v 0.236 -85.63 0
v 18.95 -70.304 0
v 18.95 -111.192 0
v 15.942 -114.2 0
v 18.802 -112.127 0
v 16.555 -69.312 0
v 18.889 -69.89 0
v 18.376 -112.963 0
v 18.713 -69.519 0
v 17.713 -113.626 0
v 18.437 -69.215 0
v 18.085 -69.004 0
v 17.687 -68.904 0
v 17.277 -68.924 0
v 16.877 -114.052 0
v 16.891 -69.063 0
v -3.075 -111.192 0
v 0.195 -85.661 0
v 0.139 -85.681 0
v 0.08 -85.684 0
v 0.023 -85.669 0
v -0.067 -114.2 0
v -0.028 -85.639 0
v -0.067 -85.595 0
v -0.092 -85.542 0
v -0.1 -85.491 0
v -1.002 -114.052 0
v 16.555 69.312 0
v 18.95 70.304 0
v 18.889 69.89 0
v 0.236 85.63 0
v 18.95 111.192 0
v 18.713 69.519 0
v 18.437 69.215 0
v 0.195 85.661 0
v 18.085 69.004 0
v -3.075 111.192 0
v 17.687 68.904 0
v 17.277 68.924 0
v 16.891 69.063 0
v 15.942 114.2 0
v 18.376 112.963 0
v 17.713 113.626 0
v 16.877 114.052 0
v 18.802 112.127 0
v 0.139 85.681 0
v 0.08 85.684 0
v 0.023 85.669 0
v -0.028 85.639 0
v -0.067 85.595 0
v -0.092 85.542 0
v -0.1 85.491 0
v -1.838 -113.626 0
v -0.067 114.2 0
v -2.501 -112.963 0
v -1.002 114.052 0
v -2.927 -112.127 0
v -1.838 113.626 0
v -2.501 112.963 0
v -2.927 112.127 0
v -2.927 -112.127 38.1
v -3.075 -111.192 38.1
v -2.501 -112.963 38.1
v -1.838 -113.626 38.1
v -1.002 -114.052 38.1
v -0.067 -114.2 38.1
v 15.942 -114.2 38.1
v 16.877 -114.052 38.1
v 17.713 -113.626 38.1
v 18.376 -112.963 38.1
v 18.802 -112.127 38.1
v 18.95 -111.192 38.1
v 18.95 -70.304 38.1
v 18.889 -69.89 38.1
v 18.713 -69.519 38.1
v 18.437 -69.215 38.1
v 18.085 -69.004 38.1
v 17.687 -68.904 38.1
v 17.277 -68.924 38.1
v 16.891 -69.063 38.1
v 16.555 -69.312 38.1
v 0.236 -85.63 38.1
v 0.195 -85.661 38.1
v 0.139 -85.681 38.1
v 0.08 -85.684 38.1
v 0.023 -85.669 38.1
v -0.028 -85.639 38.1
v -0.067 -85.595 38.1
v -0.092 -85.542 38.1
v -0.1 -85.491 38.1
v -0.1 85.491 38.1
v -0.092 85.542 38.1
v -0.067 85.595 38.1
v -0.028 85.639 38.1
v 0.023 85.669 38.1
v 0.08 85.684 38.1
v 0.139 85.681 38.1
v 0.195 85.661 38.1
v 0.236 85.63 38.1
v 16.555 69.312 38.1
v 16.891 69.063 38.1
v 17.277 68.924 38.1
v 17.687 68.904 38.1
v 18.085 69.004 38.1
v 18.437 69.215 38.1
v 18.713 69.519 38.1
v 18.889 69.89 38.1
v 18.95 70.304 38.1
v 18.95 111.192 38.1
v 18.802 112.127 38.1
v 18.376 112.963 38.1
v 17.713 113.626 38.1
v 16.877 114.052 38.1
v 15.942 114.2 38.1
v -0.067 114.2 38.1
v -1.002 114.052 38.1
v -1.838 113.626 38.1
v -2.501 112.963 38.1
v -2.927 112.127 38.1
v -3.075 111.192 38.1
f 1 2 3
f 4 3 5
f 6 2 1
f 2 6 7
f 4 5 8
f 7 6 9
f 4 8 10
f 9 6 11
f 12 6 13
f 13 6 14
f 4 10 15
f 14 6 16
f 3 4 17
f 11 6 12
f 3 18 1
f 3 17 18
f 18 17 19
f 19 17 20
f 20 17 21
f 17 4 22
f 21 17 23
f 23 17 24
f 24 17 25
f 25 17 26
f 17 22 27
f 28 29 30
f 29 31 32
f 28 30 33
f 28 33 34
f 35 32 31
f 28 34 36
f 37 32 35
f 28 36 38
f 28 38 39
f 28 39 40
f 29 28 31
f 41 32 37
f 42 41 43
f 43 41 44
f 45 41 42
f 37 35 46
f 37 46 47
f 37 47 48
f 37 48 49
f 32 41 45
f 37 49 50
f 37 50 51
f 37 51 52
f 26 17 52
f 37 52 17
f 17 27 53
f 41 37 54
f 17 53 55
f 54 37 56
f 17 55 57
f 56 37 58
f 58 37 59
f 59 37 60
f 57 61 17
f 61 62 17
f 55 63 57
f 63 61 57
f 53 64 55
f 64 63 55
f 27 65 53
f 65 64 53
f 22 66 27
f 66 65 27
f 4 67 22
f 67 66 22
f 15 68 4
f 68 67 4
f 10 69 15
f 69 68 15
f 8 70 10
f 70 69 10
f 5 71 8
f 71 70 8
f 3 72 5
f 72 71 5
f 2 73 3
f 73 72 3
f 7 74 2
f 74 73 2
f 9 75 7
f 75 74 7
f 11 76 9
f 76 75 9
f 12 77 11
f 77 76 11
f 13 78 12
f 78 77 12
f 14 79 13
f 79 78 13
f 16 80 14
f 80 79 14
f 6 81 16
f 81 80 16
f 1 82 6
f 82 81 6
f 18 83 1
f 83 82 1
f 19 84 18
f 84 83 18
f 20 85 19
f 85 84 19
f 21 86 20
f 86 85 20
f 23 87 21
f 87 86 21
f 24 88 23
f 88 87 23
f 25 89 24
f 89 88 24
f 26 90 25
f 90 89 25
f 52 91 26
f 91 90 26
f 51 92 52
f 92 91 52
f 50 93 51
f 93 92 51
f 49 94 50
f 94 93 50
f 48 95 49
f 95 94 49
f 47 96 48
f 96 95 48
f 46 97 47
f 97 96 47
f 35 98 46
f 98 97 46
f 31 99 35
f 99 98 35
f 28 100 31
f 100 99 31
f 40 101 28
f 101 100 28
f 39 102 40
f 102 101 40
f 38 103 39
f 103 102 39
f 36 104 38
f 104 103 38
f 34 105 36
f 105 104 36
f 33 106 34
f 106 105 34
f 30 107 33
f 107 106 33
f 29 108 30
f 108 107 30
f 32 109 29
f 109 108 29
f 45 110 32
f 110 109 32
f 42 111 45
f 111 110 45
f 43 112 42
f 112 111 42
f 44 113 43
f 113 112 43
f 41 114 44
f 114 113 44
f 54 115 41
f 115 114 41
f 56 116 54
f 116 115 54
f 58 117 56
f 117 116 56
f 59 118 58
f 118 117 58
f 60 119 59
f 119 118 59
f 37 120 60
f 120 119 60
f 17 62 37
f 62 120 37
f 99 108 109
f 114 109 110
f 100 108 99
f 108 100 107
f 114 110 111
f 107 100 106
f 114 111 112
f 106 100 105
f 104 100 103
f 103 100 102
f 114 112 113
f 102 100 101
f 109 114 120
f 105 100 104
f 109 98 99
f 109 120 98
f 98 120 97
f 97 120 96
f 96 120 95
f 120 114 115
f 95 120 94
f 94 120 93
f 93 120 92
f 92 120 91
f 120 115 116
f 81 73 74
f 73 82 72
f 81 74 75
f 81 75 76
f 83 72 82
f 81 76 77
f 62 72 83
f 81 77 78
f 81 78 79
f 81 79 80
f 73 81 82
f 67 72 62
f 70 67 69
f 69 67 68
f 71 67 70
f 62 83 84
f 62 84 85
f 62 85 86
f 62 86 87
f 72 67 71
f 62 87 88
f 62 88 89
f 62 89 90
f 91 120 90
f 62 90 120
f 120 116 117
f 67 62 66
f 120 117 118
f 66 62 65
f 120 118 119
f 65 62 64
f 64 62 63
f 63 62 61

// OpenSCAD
// FCUnipanel0.1
// 
// French cleat + panel as a single part,
// because messing with screws can be annoying.

height = "6chunk";
width = "1chunk";
panel_thickness = "1/8inch";
fc_height = "1+1/2inch";
fc_thickness = "3/4inch";

$tgx11_offset = -0.1;
$fn = 24;

module fcunipanel0__end_params() { }

use <../lib/TOGPolyhedronLib1.scad>
use <../lib/TOGMod1.scad>
use <../lib/TOGPath1.scad>
use <../lib/TOGUnits1.scad>
use <../lib/TOGVecLib0.scad>

panel_thickness_mm = togunits1_to_mm(panel_thickness);
fc_thickness_mm = togunits1_to_mm(fc_thickness);
fc_height_mm = togunits1_to_mm(fc_height);
height_mm = togunits1_to_mm(height);
width_mm = togunits1_to_mm(width);

togmod1_domodule(tphl1_make_polyhedron_from_layer_function([
	[0       , 0],
	[width_mm, 0],
],
let( x0 = -panel_thickness_mm )
let( x1 = 0 )
let( x2 = fc_thickness_mm )
let( fcyd0 = 0 )
let( fcyd1 = fc_height_mm )
let( fcydn = fc_height_mm - fc_thickness_mm/2 )
let( fcydf = fc_height_mm + fc_thickness_mm/2 )
let( icops = [["round", -$tgx11_offset], ["offset", $tgx11_offset]] )
let( ocops = [["round", 3.2 + $tgx11_offset], ["offset", $tgx11_offset]] )
let( pcops = [["round", 1.6 + $tgx11_offset], ["offset", $tgx11_offset]] )
function(zo) togvec0_offset_points(
	togpath1_rath_to_polypoints(["togpath1-rath",
		["togpath1-rathnode", [x0, -height_mm/2 + fcyd0], each ocops],
		["togpath1-rathnode", [x2, -height_mm/2 + fcyd0], each ocops],
		["togpath1-rathnode", [x2, -height_mm/2 + fcydf], each pcops],
		["togpath1-rathnode", [x1, -height_mm/2 + fcydn], each icops],
		["togpath1-rathnode", [x1,  height_mm/2 - fcydn], each icops],
		["togpath1-rathnode", [x2,  height_mm/2 - fcydf], each pcops],
		["togpath1-rathnode", [x2,  height_mm/2 - fcyd0], each ocops],
		["togpath1-rathnode", [x0,  height_mm/2 - fcyd0], each ocops],
	]),
	zo[0]
)));
